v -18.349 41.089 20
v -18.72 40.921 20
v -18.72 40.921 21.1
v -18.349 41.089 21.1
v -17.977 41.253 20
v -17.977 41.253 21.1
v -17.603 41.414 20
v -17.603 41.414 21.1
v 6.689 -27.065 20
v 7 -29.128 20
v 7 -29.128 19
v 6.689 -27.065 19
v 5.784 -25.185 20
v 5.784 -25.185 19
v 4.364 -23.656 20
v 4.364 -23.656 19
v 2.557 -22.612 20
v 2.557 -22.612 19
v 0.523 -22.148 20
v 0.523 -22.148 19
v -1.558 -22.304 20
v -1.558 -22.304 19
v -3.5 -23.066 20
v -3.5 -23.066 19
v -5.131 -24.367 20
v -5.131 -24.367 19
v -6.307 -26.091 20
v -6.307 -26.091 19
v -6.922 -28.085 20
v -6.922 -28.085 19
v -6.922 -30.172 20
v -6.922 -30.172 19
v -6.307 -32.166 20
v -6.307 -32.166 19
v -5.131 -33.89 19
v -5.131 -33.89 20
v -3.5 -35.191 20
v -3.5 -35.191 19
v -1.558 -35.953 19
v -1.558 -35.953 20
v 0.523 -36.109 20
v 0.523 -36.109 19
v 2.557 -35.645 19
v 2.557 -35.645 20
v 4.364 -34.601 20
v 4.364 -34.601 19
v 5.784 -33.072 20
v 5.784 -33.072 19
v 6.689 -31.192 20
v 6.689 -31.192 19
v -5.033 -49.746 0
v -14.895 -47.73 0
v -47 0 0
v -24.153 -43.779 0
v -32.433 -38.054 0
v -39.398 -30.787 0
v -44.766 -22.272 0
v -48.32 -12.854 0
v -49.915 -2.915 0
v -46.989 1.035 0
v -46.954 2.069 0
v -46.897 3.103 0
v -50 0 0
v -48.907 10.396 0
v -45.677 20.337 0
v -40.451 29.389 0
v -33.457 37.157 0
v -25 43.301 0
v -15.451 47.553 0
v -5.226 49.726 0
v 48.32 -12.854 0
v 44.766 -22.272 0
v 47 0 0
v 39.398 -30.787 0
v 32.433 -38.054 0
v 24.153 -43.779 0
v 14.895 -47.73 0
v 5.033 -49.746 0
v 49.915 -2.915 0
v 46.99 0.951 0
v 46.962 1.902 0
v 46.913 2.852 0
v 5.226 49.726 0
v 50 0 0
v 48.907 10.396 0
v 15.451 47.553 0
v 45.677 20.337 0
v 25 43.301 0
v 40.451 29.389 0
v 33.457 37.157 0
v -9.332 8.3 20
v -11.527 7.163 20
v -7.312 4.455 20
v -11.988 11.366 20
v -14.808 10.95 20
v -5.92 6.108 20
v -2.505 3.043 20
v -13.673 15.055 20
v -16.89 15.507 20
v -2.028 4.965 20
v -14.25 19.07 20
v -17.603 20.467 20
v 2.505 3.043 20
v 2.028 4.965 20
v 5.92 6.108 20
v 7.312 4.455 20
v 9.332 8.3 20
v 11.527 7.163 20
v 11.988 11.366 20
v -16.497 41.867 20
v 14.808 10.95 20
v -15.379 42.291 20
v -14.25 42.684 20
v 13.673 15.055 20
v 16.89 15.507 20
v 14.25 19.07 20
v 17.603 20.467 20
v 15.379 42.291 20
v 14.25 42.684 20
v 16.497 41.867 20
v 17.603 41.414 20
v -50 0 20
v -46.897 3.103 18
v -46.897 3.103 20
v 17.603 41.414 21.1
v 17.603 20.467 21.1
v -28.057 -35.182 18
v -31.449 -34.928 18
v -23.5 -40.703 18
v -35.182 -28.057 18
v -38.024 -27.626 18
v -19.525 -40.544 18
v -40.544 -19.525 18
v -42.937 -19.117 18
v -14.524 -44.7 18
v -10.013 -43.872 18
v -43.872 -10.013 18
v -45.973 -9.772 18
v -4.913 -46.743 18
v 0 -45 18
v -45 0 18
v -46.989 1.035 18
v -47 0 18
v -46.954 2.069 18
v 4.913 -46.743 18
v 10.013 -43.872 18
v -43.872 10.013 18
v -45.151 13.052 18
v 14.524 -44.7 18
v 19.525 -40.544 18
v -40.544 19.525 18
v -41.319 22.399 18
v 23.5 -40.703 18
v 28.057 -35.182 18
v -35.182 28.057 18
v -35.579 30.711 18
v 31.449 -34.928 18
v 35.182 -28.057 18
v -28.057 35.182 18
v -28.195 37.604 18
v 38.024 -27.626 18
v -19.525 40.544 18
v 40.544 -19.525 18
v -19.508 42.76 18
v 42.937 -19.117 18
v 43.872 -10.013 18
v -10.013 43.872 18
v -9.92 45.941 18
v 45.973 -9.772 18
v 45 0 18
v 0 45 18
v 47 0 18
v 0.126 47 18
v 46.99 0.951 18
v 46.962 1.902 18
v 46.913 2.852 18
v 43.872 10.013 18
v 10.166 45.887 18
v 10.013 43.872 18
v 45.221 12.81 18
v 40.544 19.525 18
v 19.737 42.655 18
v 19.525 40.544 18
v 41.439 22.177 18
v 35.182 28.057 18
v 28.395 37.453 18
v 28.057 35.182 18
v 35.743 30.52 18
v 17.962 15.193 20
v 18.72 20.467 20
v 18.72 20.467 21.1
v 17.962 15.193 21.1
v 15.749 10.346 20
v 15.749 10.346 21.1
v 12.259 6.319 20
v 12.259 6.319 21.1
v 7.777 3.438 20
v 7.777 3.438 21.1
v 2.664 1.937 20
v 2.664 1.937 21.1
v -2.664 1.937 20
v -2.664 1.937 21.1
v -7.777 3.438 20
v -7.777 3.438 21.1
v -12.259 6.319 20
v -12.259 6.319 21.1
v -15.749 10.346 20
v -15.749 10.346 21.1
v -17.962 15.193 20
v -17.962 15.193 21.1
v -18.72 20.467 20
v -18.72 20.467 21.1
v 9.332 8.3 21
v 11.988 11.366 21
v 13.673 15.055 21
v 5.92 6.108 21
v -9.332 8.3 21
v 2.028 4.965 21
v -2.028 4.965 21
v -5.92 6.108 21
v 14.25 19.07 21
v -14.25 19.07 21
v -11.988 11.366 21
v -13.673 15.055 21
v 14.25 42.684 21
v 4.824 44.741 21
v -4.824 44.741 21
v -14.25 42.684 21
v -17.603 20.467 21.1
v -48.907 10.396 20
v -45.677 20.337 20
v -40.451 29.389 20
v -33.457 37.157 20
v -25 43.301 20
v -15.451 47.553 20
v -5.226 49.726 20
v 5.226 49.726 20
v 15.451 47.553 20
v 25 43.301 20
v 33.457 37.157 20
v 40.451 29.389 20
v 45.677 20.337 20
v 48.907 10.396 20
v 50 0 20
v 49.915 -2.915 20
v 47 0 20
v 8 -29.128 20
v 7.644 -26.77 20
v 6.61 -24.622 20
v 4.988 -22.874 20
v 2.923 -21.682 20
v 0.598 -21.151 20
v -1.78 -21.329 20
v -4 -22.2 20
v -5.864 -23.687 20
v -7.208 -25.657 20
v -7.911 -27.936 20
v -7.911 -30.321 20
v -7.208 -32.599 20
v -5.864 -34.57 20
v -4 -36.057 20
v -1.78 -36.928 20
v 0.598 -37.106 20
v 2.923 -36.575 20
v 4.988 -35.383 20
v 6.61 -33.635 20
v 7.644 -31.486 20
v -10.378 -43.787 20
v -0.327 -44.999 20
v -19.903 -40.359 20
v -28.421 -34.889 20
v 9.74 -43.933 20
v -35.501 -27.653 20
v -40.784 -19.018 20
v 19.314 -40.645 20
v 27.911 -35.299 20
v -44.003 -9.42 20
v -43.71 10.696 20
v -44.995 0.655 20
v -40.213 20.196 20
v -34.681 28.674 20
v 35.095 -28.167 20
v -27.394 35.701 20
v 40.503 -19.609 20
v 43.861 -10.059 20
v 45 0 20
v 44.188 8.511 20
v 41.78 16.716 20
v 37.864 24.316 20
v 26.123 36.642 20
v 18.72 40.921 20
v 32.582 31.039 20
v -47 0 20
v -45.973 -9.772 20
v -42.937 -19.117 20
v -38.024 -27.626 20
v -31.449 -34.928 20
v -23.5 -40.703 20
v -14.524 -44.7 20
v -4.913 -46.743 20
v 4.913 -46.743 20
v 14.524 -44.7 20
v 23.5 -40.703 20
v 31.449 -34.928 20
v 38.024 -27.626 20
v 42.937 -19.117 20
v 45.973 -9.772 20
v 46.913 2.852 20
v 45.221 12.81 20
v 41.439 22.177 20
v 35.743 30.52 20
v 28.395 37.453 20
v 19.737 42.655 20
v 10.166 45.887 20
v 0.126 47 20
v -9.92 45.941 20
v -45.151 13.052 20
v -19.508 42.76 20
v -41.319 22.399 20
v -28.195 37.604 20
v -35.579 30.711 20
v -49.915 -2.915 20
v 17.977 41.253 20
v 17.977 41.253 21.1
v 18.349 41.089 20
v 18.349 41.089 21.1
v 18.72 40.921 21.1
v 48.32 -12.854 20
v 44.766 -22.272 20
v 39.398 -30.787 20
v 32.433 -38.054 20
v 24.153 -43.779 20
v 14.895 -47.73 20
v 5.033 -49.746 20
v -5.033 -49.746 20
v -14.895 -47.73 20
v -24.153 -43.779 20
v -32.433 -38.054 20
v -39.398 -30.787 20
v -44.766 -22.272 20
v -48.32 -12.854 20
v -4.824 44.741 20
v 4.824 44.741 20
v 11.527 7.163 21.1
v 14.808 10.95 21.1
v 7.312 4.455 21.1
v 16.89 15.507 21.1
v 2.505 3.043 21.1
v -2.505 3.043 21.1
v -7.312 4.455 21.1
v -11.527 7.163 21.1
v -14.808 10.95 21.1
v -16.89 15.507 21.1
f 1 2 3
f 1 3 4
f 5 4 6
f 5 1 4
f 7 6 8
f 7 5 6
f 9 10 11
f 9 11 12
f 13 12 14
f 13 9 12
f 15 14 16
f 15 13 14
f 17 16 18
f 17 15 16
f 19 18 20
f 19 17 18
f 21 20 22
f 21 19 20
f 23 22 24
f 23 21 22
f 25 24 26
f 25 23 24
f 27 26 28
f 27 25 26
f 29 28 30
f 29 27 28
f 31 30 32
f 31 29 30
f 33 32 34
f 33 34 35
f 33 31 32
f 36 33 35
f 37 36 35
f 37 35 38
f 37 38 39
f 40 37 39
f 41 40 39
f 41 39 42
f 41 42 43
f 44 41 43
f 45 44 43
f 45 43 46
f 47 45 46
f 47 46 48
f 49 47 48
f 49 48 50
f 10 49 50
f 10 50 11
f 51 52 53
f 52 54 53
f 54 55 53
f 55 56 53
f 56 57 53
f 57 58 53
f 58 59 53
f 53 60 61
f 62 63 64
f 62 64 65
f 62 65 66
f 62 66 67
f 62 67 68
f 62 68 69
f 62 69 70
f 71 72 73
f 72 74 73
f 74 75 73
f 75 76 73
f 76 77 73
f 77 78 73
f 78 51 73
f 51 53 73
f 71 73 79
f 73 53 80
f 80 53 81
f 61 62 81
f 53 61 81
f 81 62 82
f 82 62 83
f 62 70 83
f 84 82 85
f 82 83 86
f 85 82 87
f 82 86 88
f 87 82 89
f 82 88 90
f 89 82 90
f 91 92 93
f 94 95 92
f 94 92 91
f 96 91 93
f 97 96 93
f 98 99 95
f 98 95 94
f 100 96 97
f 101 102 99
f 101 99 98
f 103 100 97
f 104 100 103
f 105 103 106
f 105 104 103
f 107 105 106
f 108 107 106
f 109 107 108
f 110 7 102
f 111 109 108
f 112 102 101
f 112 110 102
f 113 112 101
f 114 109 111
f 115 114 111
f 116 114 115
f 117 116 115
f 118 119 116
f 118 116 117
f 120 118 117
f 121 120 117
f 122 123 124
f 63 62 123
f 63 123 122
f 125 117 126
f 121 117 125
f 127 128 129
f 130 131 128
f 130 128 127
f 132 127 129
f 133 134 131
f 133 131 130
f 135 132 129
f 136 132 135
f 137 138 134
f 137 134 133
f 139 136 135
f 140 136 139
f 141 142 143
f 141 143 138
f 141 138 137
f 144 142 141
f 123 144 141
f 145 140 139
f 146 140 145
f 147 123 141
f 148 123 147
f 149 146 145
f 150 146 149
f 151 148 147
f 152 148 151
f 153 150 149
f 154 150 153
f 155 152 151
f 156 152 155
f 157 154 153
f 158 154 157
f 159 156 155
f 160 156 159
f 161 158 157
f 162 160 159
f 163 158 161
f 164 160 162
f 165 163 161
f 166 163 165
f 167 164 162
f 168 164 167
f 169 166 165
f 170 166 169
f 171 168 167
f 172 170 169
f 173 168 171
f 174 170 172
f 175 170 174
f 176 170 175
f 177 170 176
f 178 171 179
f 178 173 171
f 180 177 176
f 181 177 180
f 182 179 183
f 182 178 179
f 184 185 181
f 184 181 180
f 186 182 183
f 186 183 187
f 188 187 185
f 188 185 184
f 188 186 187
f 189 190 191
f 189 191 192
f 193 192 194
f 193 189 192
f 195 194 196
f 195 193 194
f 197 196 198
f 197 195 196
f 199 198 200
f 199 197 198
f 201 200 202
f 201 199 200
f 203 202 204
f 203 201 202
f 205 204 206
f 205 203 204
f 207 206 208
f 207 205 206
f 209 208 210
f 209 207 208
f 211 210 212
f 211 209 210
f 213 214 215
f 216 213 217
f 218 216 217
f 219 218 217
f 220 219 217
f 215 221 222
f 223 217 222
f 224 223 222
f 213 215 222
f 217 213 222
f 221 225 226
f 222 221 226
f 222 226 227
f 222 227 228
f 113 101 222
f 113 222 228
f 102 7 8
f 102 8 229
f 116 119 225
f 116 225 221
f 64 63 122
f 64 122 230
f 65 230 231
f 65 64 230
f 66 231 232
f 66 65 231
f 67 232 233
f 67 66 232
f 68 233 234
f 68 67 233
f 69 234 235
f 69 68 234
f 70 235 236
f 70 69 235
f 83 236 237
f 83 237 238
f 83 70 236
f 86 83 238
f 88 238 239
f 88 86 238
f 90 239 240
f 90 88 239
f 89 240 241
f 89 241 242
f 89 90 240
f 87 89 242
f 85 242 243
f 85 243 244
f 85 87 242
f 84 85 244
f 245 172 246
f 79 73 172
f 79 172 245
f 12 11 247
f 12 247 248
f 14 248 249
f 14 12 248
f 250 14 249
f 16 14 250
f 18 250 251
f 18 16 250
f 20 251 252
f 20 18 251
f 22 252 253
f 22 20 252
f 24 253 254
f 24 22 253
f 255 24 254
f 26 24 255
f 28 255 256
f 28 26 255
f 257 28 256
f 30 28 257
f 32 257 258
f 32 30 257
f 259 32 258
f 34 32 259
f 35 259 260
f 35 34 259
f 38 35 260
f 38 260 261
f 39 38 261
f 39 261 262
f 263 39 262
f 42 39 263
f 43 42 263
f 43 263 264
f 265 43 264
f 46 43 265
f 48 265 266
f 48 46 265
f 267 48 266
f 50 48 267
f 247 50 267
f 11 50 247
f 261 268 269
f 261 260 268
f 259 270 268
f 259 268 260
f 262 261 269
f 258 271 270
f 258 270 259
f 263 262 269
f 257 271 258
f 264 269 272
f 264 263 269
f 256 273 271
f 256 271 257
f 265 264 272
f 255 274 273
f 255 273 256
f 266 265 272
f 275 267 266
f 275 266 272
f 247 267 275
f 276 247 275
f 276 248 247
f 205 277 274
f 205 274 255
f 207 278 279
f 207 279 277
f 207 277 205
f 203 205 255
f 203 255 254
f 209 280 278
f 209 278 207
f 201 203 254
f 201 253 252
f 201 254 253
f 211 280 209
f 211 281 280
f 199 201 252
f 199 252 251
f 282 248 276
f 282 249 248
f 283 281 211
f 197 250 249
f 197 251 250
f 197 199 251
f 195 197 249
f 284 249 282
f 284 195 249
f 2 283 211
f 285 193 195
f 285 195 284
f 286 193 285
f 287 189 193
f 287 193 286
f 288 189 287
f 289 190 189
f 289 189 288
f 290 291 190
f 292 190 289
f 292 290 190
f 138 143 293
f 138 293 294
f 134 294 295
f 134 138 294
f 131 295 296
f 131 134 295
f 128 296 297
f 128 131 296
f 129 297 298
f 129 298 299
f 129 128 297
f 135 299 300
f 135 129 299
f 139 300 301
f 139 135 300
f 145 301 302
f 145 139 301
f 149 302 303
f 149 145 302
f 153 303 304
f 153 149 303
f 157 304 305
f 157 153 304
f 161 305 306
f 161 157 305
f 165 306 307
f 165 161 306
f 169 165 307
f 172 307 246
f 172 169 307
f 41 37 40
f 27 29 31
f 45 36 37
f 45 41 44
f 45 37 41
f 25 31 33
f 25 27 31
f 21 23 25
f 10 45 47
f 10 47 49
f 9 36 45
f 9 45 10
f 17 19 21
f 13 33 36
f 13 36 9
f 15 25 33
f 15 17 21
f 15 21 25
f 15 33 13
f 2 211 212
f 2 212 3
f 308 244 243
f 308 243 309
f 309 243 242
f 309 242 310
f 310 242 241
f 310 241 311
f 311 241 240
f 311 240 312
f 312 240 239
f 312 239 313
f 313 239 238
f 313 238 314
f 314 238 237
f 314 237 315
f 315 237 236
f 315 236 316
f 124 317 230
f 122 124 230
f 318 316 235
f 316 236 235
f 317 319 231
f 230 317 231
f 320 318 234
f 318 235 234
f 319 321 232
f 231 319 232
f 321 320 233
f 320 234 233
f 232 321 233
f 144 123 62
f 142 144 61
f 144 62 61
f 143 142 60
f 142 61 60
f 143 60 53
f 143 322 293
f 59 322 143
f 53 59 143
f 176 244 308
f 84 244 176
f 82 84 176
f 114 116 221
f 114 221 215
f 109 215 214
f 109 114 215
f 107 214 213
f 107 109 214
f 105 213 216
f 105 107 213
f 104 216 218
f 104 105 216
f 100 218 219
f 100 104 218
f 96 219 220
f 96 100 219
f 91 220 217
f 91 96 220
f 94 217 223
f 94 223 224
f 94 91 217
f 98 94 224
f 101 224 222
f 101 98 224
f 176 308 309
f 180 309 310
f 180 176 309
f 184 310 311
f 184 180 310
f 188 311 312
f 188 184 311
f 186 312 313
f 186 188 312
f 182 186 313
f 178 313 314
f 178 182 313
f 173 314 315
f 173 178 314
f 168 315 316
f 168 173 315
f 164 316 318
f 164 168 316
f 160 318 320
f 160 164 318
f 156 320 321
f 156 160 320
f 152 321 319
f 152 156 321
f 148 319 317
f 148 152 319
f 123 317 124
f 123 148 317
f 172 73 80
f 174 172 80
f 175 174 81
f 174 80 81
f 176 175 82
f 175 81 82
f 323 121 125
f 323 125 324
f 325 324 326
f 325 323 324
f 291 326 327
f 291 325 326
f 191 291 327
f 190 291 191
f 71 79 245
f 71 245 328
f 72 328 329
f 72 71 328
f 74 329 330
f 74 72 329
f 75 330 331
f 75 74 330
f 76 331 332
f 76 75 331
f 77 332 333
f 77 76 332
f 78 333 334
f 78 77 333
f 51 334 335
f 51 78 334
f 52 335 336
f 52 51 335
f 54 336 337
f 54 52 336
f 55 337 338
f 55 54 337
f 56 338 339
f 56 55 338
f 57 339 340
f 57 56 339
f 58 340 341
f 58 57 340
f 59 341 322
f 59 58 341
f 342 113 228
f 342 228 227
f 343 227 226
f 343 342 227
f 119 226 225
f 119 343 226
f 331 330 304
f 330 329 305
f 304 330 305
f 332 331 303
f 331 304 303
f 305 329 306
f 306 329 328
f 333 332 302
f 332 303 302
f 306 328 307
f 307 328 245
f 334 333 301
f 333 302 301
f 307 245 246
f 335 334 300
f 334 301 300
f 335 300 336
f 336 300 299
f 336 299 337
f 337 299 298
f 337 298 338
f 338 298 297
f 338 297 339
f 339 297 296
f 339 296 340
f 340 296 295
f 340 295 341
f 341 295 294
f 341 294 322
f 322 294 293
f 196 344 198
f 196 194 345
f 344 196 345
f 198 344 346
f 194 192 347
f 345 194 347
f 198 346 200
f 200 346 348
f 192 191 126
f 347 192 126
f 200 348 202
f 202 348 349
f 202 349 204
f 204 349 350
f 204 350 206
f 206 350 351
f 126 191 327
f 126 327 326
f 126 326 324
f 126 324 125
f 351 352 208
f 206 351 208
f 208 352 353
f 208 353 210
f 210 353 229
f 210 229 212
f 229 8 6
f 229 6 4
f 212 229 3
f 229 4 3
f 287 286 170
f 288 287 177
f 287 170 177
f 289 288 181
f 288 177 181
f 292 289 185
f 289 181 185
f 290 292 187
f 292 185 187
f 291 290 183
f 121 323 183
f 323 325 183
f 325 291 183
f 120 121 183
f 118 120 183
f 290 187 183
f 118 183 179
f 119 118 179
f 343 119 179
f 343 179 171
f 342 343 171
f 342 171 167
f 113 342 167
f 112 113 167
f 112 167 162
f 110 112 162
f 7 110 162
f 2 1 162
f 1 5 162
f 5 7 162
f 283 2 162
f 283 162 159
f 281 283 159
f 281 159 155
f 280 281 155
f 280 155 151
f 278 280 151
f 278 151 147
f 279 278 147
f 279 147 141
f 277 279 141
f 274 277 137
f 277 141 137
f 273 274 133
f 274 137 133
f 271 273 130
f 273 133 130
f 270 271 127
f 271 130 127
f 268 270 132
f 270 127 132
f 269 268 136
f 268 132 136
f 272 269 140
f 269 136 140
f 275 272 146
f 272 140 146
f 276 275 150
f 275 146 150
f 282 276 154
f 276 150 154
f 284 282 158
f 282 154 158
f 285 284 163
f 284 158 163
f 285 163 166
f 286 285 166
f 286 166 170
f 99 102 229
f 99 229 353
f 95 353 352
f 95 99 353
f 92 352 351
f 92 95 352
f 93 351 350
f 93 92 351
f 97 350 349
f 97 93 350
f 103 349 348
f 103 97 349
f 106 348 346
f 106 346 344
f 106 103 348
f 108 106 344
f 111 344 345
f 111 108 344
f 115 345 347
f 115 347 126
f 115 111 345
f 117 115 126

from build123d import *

# Parameters (mm, degrees)
BOSS_EXTRUDE1_DEPTH      = 20
BOSS_EXTRUDE1_2_DEPTH    = 20
SKETCH2_R                = 47
BOSS_EXTRUDE2_DEPTH      = 18
SKETCH3_R                = 45
BOSS_EXTRUDE3_DEPTH      = 2
SKETCH4_R                = 7
CUT_EXTRUDE1_DEPTH       = 1
CHAMFER1_SIZE            = 1
BOSS_EXTRUDE4_START      = 1
SKETCH5_R                = 7
BOSS_EXTRUDE4_DEPTH      = 1
BOSS_EXTRUDE5_DEPTH      = 1
BOSS_EXTRUDE6_DEPTH      = 0.1
BOSS_EXTRUDE6_DEPTH_BACK = 1


with BuildPart() as part:
    # Sketch1 → Boss-Extrude1 (new body)
    with BuildSketch(Plane.XY):
        with BuildLine():
            Line((47, 0), (49.914957884, -2.914957884))
            ThreePointArc((49.914957884, -2.914957884), (0, -50), (-49.914957884, -2.914957884))
            Line((-49.914957884, -2.914957884), (-47, 0))
            ThreePointArc((-47, 0), (0, -47), (47, 0))
        make_face()
    extrude(amount=BOSS_EXTRUDE1_DEPTH)



with BuildPart() as body_2:
    # Sketch1 → Boss-Extrude1 2 (new body)
    with BuildSketch(Plane.XY):
        with BuildLine():
            Line((50, 0), (46.913413371, 2.851604096))
            ThreePointArc((46.913413371, 2.851604096), (0.125706164, 46.999831893), (-46.89748844, 3.10251156))
            Line((-46.89748844, 3.10251156), (-50, 0))
            ThreePointArc((-50, 0), (0, 50), (50, 0))
        make_face()
    extrude(amount=BOSS_EXTRUDE1_2_DEPTH)


with BuildPart() as part_1:
    add(part.part)

    add(body_2.part)  # Boss-Extrude2 merges body 2
    # Sketch2 → Boss-Extrude2 (add)
    with BuildSketch(Plane.XY):
        Circle(SKETCH2_R)
    extrude(amount=BOSS_EXTRUDE2_DEPTH)

    # Sketch3 → Boss-Extrude3 (add)
    with BuildSketch(Plane.XY.offset(18)):
        Circle(SKETCH3_R)
    extrude(amount=BOSS_EXTRUDE3_DEPTH)

    # Sketch4 → Cut-Extrude1 (cut)
    with BuildSketch(Plane.XY.offset(20)):
        with Locations((0, -29.128438865)):
            Circle(SKETCH4_R)
    extrude(amount=-CUT_EXTRUDE1_DEPTH, mode=Mode.SUBTRACT)

    # Chamfer1
    chamfer1_edges = [part_1.edges().sort_by_distance(p)[0] for p in [
        (-7, -29.128438865, 20),
    ]]
    chamfer(chamfer1_edges, length=CHAMFER1_SIZE - 0.0001)  # a hair under: the kernel refuses the full size

    # Sketch5 → Boss-Extrude4 (add)
    with BuildSketch(Plane.XY.offset(19).offset(BOSS_EXTRUDE4_START)):
        with Locations((0, -29.128438865)):
            Circle(SKETCH5_R)
    extrude(amount=-BOSS_EXTRUDE4_DEPTH)

    # Sketch7 → Boss-Extrude5 (add)
    with BuildSketch(Plane.XY.offset(20)):
        with BuildLine():
            Line((14.249883761, 42.684198631), (14.249883761, 19.069697386))
            ThreePointArc((14.249883761, 19.069697386), (0, 4.819813625), (-14.249883761, 19.069697386))
            Line((-14.249883761, 19.069697386), (-14.249883761, 42.684198631))
            ThreePointArc((-14.249883761, 42.684198631), (0, 45), (14.249883761, 42.684198631))
        make_face()
    extrude(amount=BOSS_EXTRUDE5_DEPTH)

    # Sketch8 → Boss-Extrude6 (add, two sides: drawn at the far end of the back side and taken through both)
    with BuildSketch(Plane.XY.offset(21).offset(-BOSS_EXTRUDE6_DEPTH_BACK)):
        with BuildLine():
            Line((18.72043553, 40.921208359), (18.72043553, 20.466744814))
            ThreePointArc((18.72043553, 20.466744814), (0, 1.746309284), (-18.72043553, 20.466744814))
            Line((-18.72043553, 20.466744814), (-18.72043553, 40.921208359))
            ThreePointArc((-18.72043553, 40.921208359), (-18.1632897, 41.1715303), (-17.602797587, 41.414267072))
            Line((-17.602797587, 41.414267072), (-17.602797587, 20.466744814))
            ThreePointArc((-17.602797587, 20.466744814), (0, 2.863947227), (17.602797587, 20.466744814))
            Line((17.602797587, 20.466744814), (17.602797587, 41.414267072))
            ThreePointArc((17.602797587, 41.414267072), (18.1632897, 41.1715303), (18.72043553, 40.921208359))
        make_face()
    extrude(amount=BOSS_EXTRUDE6_DEPTH + BOSS_EXTRUDE6_DEPTH_BACK)


solid = part_1.part
